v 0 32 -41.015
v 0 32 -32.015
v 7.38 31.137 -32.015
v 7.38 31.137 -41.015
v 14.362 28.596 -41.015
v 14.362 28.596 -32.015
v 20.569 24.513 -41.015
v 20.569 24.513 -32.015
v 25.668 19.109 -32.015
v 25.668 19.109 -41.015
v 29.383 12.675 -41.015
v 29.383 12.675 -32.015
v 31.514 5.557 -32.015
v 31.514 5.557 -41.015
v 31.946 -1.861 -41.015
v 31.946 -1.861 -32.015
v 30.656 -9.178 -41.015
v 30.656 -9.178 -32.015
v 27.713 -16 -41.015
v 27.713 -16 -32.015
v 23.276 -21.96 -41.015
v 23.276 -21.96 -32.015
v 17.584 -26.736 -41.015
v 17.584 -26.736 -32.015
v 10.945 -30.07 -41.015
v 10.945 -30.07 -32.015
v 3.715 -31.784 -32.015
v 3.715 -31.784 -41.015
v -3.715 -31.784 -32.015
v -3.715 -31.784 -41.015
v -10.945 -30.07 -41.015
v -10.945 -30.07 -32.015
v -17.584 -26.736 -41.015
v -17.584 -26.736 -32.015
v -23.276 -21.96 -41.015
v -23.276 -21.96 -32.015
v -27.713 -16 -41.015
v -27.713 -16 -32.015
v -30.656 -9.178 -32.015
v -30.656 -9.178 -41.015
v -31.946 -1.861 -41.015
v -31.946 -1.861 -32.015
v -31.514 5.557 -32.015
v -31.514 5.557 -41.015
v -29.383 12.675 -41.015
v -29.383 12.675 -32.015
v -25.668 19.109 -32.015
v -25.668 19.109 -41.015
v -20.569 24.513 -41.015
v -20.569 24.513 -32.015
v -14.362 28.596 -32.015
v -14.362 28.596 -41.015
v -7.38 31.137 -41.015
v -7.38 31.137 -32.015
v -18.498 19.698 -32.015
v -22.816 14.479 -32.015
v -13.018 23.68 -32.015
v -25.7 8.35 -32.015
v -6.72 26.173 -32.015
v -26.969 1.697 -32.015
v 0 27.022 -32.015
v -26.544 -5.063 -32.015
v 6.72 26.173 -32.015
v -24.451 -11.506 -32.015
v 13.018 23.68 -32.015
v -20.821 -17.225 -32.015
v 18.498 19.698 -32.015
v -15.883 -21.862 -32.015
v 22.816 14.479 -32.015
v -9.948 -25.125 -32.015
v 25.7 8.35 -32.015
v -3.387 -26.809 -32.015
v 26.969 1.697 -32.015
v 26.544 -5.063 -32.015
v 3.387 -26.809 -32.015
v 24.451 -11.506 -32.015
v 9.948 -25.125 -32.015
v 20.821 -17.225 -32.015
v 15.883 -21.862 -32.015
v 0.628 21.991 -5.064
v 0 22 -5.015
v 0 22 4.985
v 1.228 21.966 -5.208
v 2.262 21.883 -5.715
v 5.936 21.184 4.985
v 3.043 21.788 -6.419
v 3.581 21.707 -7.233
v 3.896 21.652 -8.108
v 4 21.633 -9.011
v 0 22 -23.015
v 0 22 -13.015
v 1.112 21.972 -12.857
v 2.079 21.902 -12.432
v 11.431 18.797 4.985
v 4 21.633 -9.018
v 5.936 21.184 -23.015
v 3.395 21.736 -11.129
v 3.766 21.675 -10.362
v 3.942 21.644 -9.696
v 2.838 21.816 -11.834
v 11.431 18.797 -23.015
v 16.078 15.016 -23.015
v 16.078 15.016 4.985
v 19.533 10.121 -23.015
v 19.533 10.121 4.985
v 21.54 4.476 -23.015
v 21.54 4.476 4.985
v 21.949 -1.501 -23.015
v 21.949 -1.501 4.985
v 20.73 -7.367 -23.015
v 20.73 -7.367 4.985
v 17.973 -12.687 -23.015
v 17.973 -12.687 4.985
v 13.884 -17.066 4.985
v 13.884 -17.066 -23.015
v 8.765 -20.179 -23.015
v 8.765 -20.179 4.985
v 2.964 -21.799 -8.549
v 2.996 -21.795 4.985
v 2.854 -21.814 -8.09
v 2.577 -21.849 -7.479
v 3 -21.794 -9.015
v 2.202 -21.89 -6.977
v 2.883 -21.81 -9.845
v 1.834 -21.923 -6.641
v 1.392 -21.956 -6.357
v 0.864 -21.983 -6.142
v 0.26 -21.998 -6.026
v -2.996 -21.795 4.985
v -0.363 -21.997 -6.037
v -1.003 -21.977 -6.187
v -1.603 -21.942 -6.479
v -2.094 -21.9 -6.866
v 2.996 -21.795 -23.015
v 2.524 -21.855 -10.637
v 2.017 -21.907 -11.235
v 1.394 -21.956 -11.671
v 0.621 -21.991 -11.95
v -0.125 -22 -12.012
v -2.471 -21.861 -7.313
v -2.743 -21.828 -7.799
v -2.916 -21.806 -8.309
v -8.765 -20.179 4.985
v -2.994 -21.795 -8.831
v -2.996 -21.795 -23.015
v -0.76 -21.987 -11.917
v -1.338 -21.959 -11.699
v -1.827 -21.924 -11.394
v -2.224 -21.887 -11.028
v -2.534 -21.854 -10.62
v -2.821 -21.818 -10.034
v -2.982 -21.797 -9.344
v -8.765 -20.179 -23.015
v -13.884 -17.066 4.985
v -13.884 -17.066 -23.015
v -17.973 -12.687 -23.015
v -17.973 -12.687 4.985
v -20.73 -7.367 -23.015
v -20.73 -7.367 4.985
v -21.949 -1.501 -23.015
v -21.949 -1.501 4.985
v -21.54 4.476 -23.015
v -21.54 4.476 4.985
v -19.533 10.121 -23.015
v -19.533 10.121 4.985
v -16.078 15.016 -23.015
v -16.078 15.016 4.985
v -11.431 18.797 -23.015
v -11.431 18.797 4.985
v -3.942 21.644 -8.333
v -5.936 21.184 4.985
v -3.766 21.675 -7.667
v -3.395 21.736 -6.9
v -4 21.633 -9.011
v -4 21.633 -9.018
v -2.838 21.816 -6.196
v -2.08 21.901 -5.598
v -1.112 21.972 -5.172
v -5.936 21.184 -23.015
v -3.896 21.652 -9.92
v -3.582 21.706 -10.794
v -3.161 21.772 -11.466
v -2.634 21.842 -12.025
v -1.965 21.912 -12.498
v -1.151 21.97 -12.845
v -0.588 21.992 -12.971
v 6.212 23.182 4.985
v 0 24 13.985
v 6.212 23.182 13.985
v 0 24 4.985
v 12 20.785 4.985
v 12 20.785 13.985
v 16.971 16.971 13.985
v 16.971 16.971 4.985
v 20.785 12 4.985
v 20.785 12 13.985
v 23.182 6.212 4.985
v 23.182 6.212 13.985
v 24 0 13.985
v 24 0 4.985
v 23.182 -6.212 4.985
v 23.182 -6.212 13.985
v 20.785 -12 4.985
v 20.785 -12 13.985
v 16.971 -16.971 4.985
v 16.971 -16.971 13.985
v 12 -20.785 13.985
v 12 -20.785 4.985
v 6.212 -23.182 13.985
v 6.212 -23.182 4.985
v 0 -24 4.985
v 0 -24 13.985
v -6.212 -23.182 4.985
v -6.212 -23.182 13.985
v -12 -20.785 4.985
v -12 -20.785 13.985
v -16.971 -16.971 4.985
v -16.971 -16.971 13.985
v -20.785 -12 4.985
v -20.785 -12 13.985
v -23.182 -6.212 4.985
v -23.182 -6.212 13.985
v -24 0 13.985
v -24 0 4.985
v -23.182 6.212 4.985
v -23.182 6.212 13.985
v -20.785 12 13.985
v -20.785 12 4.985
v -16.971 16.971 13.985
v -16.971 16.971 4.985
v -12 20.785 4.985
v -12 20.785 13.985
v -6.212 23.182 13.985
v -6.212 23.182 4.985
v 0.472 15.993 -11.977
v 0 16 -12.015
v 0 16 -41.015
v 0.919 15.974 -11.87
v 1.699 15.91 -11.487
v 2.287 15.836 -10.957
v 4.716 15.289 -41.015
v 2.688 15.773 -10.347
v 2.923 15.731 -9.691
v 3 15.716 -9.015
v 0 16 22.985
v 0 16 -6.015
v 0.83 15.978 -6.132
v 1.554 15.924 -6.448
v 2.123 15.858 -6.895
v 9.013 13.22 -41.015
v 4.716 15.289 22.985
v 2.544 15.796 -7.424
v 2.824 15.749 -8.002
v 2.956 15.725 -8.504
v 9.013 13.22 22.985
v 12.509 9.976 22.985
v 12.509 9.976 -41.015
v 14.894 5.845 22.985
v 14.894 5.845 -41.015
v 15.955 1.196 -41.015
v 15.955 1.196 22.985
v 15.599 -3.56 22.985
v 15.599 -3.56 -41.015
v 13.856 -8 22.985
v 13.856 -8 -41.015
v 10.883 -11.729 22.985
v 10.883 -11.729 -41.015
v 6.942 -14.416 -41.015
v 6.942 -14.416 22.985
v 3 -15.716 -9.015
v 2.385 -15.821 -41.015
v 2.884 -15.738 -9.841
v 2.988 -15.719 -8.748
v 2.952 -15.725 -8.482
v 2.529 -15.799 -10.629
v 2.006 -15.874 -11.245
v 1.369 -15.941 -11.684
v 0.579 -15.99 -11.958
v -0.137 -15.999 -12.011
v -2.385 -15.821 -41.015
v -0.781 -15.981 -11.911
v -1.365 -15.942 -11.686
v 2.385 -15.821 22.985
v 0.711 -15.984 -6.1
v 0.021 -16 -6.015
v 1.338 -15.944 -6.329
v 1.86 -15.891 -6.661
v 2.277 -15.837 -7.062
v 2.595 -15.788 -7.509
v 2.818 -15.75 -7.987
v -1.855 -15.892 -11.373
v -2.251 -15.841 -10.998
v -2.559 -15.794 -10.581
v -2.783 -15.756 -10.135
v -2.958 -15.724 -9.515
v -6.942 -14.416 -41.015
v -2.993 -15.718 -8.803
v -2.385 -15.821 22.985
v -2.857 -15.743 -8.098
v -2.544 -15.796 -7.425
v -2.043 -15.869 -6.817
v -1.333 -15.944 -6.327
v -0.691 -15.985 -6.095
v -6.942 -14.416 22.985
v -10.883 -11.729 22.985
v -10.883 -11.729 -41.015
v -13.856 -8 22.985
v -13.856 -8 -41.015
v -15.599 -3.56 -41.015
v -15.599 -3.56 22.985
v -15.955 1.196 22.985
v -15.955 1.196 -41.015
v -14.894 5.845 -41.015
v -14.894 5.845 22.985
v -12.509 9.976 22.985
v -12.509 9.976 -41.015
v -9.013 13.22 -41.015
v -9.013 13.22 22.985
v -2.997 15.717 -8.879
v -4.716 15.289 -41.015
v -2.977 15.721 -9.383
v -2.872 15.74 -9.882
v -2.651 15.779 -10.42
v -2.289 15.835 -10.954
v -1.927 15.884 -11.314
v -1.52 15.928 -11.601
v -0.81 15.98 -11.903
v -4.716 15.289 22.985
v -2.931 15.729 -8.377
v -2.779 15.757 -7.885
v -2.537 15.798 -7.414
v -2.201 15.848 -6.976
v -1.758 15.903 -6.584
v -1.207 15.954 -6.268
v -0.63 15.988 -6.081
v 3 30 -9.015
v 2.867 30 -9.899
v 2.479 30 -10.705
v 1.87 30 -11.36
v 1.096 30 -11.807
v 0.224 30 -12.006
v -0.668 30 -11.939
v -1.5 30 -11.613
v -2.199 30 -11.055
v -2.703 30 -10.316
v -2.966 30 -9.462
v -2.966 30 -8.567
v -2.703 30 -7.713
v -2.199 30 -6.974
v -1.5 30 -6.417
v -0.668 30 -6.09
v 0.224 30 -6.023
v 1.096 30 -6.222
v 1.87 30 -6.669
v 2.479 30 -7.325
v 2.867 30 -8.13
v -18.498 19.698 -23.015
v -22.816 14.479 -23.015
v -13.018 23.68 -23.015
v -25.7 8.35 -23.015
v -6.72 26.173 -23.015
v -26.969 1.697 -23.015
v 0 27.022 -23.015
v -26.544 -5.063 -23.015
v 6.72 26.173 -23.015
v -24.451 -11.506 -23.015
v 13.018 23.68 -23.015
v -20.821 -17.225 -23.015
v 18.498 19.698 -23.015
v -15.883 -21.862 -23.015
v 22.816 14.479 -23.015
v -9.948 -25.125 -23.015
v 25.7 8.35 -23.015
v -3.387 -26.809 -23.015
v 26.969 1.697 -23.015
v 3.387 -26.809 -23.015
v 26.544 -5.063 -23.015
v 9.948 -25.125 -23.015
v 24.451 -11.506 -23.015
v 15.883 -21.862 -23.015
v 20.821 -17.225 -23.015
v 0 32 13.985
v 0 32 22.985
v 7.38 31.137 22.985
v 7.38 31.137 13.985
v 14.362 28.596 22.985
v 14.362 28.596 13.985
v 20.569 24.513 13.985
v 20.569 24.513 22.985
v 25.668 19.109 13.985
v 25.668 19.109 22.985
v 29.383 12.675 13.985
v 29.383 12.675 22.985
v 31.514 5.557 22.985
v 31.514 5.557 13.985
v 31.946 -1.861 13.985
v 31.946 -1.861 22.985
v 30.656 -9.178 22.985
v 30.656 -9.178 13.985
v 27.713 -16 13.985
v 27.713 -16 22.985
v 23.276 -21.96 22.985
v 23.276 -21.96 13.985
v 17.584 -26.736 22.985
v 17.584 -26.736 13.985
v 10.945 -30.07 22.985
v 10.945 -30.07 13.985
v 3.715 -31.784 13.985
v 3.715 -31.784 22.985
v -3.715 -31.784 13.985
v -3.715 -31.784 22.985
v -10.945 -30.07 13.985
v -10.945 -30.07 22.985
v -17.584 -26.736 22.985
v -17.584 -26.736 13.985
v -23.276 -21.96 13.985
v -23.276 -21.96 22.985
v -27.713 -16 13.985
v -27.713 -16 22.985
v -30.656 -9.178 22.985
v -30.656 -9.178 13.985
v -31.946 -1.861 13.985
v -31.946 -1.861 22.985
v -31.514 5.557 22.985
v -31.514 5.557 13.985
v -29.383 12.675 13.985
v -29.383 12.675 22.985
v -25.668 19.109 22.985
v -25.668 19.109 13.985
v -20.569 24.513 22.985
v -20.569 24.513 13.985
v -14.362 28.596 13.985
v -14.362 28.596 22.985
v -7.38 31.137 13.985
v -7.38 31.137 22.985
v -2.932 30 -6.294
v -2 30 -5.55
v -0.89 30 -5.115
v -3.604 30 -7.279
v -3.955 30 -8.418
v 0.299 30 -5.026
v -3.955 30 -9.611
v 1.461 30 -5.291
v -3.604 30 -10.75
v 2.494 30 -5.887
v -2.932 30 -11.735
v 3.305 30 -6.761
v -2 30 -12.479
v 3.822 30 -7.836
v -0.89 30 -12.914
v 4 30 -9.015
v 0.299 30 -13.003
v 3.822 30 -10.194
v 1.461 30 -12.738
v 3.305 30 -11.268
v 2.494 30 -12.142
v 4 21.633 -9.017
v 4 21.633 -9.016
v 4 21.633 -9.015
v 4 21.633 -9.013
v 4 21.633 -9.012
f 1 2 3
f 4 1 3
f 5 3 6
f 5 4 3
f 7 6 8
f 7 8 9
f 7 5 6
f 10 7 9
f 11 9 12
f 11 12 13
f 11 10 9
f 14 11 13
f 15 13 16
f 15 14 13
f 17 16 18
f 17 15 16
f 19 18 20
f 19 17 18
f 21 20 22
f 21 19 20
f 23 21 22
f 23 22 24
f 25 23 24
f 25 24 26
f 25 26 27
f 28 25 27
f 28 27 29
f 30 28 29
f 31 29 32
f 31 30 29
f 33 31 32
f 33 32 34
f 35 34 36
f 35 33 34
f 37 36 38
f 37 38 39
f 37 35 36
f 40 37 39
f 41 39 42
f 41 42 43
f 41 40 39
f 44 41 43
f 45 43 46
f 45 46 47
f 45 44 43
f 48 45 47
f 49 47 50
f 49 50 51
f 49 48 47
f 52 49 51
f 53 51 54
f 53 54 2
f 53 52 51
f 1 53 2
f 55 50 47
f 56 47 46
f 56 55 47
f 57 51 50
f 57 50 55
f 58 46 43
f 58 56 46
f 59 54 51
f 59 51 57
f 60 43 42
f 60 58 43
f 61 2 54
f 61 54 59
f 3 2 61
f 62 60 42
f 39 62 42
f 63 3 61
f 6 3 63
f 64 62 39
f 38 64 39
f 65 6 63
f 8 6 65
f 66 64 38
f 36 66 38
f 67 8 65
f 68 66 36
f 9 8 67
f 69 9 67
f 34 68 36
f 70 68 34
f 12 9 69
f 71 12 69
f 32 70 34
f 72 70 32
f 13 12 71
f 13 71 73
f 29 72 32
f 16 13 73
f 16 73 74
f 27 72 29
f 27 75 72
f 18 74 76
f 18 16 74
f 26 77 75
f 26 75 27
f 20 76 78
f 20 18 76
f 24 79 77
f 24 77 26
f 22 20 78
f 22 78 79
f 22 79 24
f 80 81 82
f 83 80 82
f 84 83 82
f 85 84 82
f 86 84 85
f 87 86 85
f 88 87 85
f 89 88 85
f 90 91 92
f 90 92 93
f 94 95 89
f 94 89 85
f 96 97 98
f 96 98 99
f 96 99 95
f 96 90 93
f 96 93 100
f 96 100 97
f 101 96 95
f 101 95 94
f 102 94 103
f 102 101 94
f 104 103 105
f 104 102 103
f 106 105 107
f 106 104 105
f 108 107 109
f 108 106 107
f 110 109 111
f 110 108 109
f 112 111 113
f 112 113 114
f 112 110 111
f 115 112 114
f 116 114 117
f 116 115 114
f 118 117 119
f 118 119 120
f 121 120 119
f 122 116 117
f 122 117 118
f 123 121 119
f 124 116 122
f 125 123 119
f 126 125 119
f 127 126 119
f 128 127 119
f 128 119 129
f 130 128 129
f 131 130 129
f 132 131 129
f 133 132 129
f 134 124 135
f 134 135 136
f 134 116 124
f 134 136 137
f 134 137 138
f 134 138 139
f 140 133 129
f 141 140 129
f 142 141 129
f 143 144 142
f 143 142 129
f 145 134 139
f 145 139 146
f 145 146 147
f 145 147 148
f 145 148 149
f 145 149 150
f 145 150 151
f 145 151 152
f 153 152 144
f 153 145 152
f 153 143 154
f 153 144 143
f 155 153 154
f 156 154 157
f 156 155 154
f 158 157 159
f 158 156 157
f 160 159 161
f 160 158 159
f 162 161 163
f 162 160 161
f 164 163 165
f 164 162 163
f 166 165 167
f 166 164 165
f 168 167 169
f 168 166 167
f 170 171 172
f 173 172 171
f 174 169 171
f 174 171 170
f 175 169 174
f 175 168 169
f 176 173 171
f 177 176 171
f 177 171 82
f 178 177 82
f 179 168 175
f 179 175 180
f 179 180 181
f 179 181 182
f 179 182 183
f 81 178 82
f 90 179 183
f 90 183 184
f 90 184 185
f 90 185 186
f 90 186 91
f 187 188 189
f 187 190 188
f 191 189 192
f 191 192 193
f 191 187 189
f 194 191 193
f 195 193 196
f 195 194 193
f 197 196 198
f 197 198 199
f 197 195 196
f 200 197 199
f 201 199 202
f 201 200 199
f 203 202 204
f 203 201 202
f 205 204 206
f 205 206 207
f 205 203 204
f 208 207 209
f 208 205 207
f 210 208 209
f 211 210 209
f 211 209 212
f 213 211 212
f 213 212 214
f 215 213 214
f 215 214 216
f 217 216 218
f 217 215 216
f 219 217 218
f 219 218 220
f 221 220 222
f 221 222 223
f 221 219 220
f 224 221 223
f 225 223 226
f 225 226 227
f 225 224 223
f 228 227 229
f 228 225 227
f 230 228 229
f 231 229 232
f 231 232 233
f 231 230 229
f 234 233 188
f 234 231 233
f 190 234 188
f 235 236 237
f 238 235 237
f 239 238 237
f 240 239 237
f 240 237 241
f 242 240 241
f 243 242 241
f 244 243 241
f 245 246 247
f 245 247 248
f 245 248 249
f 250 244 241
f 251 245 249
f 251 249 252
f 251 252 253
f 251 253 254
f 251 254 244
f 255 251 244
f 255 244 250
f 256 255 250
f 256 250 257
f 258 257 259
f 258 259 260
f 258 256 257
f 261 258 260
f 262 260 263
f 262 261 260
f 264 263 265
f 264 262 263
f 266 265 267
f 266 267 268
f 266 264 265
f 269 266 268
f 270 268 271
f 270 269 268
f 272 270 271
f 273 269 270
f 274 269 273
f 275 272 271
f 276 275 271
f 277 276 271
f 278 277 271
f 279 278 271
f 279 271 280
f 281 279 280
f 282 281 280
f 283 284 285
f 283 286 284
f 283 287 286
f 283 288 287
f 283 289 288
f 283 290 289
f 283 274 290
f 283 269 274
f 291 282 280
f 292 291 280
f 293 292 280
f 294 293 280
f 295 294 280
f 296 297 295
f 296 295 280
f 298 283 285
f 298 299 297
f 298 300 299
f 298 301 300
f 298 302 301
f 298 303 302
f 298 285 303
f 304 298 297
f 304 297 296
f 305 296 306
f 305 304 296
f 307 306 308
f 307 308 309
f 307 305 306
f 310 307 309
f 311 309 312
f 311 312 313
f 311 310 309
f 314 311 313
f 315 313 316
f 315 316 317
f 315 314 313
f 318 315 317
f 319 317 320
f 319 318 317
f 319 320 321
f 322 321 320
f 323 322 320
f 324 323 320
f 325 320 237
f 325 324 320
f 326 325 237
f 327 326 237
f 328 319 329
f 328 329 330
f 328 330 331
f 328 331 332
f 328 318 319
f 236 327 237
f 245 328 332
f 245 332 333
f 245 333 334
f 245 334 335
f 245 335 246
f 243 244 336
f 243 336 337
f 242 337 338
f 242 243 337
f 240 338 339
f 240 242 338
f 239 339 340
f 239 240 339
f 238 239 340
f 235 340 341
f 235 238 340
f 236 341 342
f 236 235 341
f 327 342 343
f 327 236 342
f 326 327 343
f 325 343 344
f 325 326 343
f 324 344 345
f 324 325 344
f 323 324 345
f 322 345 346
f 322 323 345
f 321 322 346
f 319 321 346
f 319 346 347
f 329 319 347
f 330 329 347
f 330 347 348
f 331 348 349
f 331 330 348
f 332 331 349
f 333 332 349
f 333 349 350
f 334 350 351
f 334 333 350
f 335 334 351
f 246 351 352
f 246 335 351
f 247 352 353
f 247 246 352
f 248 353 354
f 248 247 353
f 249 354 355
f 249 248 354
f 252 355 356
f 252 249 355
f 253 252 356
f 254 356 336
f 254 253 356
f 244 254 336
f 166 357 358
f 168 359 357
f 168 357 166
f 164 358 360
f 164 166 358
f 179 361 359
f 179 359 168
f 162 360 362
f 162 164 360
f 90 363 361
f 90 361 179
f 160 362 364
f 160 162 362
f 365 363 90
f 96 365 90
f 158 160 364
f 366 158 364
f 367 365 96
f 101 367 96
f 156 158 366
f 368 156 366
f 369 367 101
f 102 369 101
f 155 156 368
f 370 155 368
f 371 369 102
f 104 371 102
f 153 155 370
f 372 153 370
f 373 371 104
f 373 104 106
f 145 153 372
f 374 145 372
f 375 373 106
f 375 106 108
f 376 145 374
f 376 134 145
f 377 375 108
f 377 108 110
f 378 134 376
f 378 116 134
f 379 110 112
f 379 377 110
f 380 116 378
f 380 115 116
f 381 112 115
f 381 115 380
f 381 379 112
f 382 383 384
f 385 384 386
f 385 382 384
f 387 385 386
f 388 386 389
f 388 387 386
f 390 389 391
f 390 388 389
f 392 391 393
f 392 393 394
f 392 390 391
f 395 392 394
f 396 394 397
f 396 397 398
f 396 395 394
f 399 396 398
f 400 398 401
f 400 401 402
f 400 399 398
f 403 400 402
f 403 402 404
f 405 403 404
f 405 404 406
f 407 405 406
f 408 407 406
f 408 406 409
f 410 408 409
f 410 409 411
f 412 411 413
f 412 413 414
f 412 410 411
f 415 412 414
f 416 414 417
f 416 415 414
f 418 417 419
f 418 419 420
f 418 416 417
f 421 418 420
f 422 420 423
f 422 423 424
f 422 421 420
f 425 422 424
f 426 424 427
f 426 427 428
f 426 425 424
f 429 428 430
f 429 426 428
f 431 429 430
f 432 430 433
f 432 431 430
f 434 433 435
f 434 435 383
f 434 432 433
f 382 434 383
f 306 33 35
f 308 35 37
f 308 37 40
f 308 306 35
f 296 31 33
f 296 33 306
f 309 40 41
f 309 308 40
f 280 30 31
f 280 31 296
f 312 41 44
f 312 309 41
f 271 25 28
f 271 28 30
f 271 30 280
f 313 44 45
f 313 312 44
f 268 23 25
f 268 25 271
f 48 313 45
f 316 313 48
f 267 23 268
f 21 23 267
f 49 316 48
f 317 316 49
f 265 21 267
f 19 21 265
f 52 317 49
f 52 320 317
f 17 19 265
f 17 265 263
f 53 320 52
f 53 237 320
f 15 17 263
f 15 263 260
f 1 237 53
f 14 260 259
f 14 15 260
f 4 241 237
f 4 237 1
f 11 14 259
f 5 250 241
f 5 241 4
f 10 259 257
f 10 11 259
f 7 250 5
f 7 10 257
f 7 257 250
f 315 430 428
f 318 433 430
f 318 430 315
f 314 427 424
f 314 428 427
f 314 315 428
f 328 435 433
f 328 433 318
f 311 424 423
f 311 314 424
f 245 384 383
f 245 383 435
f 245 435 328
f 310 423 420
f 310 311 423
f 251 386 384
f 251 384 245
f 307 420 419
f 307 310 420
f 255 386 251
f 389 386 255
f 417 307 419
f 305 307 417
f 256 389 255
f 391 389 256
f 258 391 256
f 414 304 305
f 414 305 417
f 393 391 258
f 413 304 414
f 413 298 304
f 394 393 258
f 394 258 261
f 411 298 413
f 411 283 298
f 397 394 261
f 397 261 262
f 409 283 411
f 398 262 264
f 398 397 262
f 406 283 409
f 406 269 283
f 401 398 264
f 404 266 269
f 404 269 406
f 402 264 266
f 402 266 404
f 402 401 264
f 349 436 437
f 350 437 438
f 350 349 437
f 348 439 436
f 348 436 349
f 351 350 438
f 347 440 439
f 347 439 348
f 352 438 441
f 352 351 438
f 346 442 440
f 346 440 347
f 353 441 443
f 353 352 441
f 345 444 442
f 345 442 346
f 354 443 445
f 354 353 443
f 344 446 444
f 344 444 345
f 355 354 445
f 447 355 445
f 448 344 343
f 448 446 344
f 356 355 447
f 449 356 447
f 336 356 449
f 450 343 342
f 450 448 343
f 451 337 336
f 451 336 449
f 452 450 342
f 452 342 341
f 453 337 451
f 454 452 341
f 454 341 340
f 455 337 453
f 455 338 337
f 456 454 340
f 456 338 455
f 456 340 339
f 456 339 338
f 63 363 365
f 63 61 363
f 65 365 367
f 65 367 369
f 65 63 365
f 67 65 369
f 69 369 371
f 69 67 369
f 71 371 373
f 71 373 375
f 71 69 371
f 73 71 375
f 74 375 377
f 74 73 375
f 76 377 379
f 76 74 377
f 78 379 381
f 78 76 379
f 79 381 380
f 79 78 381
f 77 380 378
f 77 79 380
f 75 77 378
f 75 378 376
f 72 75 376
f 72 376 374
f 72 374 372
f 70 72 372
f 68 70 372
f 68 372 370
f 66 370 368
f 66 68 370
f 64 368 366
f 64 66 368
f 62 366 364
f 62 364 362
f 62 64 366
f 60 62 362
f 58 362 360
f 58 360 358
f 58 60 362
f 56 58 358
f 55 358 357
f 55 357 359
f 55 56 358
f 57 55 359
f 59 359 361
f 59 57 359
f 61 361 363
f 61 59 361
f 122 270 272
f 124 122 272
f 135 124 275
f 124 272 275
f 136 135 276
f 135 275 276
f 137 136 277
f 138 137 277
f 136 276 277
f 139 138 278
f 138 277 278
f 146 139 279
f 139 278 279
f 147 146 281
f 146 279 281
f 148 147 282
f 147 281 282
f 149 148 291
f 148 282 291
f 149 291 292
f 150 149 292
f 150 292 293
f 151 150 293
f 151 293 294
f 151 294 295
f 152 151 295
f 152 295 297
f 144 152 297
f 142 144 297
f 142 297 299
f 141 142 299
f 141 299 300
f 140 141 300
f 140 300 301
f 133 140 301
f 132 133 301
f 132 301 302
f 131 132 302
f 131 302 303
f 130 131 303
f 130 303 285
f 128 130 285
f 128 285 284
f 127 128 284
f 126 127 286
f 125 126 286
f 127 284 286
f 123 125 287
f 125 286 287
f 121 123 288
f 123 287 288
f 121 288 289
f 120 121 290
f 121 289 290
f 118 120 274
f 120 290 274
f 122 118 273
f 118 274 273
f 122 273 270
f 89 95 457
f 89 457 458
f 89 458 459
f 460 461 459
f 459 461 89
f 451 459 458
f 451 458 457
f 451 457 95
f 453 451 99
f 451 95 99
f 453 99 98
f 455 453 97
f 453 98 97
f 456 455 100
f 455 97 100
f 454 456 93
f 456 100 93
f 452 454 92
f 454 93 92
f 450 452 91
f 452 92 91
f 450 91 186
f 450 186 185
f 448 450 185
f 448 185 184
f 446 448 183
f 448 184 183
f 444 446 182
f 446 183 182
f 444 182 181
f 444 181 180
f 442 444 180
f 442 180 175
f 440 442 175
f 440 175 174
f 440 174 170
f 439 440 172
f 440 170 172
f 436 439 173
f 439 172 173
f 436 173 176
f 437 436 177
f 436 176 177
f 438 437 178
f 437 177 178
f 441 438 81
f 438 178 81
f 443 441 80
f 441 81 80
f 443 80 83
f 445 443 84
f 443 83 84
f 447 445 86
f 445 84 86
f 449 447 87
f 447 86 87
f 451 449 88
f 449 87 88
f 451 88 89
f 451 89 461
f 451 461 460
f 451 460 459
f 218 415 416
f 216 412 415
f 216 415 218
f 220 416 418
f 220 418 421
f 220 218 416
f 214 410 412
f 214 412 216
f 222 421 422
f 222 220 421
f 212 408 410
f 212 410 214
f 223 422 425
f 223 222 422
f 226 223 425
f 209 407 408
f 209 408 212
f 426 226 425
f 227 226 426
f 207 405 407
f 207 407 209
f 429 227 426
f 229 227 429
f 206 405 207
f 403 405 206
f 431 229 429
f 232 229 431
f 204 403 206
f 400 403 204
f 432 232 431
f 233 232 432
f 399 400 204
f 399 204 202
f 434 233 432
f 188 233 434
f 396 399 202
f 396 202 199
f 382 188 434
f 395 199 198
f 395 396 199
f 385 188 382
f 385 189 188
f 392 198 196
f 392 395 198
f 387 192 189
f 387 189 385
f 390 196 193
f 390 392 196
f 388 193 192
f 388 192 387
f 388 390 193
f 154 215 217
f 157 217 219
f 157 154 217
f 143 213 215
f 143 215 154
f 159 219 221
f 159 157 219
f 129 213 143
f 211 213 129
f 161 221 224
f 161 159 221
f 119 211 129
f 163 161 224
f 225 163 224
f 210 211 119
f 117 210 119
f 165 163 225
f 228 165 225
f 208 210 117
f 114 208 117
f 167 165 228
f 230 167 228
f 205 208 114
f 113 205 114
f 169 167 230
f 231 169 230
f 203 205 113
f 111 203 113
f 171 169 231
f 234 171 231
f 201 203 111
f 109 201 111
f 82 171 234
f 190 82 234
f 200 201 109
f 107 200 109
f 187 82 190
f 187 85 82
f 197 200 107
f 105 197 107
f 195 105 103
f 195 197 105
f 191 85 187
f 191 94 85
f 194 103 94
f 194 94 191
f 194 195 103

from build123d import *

# Parameters (mm, degrees)
BOSS_EXTRUDE1_START     = 22
SKETCH3_R               = 4
BOSS_EXTRUDE1_DEPTH     = 8
BOSS_EXTRUDE2_START     = -2e-06
SKETCH4_R               = 4
BOSS_EXTRUDE2_DEPTH     = 0.366694
SKETCH2_R               = 3
CUT_EXTRUDE2_DEPTH      = 33
CUT_EXTRUDE2_DEPTH_BACK = 33


with BuildPart() as part:
    # Sketch1 → Revolve1 (revolve)
    with BuildSketch(Plane(origin=(0, 0, 0), x_dir=(0, 0, -1), z_dir=(1, 0, 0))):
        Polygon((-22.985422917, 16), (-22.985422917, 32), (-13.985422917, 32), (-13.985422917, 24), (-4.985422917, 24), (-4.985422917, 22), (23.014577083, 22), (23.014577083, 27.022421525), (32.014577083, 27.022421525), (32.014577083, 32), (41.014577083, 32), (41.014577083, 16), align=None)
    revolve(axis=Axis((0, 0, 0), (0, 0, -1)))



with BuildPart() as body_2:
    # Sketch3 → Boss-Extrude1 (new body)
    with BuildSketch(Plane(origin=(0, 0, 0), x_dir=(1, 0, 0), z_dir=(0, 1, 0)).offset(BOSS_EXTRUDE1_START)):
        with Locations((0, 9.014577083)):
            Circle(SKETCH3_R)
    extrude(amount=BOSS_EXTRUDE1_DEPTH)


with BuildPart() as part_1:
    add(part.part)

    add(body_2.part)  # Boss-Extrude2 merges body 2
    # Sketch4 → Boss-Extrude2 (add)
    with BuildSketch(Plane.XZ.offset(-22).offset(BOSS_EXTRUDE2_START)):
        with Locations((0, -9.014577083)):
            Circle(SKETCH4_R)
    extrude(amount=BOSS_EXTRUDE2_DEPTH)

    # Sketch2 → Cut-Extrude2 (cut, two sides)
    with BuildSketch(Plane(origin=(0, 0, 0), x_dir=(1, 0, 0), z_dir=(0, 1, 0))) as cut_extrude2_sk:
        with Locations((0, 9.014577083)):
            Circle(SKETCH2_R)
    extrude(amount=CUT_EXTRUDE2_DEPTH, mode=Mode.SUBTRACT)
    extrude(cut_extrude2_sk.sketch, amount=-CUT_EXTRUDE2_DEPTH_BACK, mode=Mode.SUBTRACT)


solid = part_1.part
